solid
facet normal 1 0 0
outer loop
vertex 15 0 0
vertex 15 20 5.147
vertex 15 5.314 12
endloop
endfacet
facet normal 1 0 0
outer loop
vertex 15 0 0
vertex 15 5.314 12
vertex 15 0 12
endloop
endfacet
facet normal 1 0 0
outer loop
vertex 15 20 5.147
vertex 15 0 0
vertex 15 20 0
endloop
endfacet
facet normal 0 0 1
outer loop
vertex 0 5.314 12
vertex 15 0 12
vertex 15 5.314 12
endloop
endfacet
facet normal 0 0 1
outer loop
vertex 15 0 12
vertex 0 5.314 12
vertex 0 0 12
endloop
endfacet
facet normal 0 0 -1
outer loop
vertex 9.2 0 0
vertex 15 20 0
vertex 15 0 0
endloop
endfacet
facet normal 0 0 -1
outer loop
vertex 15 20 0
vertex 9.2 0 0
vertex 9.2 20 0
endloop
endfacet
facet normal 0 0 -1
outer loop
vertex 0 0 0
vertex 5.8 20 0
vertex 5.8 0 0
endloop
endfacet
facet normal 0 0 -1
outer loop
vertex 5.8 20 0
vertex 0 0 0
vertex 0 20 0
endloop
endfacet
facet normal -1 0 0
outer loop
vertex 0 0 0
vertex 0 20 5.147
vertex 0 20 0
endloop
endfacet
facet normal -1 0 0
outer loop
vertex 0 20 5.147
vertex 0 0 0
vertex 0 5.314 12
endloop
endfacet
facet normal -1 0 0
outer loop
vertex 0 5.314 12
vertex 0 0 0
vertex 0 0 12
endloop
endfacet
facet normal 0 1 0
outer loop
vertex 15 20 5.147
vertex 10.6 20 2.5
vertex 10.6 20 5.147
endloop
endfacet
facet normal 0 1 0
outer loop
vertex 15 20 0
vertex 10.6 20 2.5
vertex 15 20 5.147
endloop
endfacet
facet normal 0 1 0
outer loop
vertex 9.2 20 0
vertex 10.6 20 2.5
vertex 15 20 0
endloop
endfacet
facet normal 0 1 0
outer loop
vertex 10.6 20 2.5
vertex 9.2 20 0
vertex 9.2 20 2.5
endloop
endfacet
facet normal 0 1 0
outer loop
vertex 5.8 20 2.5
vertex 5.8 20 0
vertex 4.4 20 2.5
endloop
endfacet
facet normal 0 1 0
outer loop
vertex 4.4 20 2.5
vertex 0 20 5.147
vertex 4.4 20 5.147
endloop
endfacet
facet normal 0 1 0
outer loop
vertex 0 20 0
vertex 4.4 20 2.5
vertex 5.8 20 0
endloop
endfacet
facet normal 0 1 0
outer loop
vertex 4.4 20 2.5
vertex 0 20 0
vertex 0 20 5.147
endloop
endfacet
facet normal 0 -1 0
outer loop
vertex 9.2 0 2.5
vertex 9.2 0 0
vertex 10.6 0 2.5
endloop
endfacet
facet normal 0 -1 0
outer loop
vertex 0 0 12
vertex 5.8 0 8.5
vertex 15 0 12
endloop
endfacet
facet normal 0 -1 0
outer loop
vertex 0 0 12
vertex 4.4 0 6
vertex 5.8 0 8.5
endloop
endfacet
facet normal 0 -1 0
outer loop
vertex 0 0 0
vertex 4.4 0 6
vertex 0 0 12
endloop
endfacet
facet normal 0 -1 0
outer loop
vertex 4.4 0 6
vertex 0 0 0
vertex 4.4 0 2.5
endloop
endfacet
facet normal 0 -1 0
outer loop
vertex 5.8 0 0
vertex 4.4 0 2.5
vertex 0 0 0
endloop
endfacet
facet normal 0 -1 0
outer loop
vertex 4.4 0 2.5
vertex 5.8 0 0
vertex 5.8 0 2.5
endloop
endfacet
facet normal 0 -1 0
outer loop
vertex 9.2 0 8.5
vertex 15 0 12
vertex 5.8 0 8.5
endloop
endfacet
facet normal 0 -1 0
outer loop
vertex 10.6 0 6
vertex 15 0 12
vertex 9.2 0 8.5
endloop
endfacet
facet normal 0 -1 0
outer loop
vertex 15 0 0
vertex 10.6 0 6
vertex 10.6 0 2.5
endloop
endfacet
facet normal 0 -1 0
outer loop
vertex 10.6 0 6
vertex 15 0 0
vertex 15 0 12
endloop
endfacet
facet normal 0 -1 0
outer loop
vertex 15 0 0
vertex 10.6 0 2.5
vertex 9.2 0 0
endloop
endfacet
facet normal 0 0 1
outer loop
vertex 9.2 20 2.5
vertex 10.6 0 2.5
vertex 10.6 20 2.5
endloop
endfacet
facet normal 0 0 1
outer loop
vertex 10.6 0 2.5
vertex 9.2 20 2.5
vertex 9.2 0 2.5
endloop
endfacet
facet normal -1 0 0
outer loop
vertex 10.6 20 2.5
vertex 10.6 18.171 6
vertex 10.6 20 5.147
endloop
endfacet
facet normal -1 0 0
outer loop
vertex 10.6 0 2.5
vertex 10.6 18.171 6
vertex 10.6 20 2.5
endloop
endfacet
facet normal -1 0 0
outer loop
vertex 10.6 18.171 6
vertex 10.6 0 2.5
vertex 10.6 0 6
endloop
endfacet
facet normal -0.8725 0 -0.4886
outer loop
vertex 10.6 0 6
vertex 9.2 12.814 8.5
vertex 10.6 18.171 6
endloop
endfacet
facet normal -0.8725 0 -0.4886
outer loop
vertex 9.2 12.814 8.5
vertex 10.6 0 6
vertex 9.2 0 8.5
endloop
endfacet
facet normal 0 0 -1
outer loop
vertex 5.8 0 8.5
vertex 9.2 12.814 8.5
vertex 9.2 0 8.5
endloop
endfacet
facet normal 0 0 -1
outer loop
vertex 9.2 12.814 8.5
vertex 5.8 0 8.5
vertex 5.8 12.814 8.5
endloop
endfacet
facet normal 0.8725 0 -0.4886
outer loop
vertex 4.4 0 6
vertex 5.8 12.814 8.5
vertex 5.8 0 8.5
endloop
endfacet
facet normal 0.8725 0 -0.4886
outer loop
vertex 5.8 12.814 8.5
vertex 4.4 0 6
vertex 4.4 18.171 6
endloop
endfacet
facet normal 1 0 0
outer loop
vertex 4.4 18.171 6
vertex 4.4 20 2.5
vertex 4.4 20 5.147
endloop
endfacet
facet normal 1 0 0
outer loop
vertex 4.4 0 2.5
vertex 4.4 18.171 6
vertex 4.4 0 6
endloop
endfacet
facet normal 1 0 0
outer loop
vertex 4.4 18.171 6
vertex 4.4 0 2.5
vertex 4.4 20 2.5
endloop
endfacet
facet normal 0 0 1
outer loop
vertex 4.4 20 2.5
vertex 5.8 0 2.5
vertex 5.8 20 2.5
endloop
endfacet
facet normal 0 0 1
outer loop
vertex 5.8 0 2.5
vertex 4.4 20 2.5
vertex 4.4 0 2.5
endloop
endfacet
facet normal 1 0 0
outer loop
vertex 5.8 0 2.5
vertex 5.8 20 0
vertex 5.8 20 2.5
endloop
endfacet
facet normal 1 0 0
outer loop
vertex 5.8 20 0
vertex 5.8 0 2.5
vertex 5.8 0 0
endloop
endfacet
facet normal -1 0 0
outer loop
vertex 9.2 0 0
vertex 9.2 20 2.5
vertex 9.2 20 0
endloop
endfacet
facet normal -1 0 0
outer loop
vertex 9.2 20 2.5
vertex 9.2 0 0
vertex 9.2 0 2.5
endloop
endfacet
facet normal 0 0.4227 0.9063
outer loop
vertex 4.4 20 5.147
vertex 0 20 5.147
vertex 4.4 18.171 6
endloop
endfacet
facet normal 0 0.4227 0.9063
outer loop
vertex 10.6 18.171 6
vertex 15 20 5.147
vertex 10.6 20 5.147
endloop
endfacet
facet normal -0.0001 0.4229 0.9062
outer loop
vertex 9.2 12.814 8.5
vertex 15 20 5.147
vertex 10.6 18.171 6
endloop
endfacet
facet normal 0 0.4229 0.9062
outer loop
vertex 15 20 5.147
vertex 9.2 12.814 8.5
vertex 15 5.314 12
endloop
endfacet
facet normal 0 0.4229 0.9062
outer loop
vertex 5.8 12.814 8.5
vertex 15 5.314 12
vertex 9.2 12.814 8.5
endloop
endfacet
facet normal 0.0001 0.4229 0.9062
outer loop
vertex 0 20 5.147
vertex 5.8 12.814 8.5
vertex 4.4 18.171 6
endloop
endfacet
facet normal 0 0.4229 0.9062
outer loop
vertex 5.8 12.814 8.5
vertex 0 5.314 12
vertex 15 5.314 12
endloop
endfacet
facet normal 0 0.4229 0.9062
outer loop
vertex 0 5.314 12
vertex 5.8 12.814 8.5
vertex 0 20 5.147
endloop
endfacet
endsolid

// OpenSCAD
// The build plate I will be using for this build is an aluminium heated plate
// with a diameter of 220mm while the frame size needs a build plate of about
// 244mm diameter to fit on all three sides.
//
// An extension bracket to fit on the insides of all three frame sections will
// be used to make the the build plate fit.
//
// The bracket will consist os a stip of metal or aluminium the bolts onto the
// top of the frame extrusion in the center of each of the horizontal beams.
//
// For support a printed gusset will fit beneath the plate and against the
// extrusion frame. The gusset will be printed in ABS, but for extra protection
// from the heated bed, a layer of 3mm rubber will be used between the gusset
// and alu/metal plate.


plateT = 1.5;       // Thickness of the metal plate used for the extension top
isolationT = 3;     // Thickness of the isolation rubber between gusset and plate
extend = 20;        // The distance to extend into the frame

extrusion = 15;     // Openbeam extrusion size;


/**
 * This module is used to create a dynamic length extrusion from a 1000mm 1515
 * extrusion STL file
 **/
module extrusion_15(len=240) {
  difference() {
    import("1515_1000mm.stl", convexity=10);
    translate([-10,-10,len])
        cube([20,20,(1000-len)+2]);
  }
}

/**
 * To make adjustment easier, the gusset has a slot, much like the openbeam
 * extrusions, at the top.
 *
 * NOTE! The gusset is generated upside down, which is also the correct
 * orientation for printing.
 *
 * @param ext: The amount of extention into the frame.
 **/
module Gusset() {
    topT = plateT;          // Thickness of the top metal/alu strip
    isoT = isolationT;      // Thickness of the isolation rubber

    slotLipH = 2.5;     // Height of the upper lips of the slot
    slotDepth = 6;
    slotWidthT = 3.4;
    slotWidthB = 6.2;
    slotLipW = (slotWidthB-slotWidthT)/2;

    w = extrusion;      // Bracket width is the same as the extrusion width
    h = extrusion-isoT; // Max height of the bracket
    l = extend;            // Length it extends into the frame

    difference() {
        // The main stock - upside down
        cube([w, l, h]);
        // Slot for the M3 nuts to go in
        translate([-slotWidthB/2+w/2, l+1, slotLipH])
            rotate([90, 0, 0])
                linear_extrude(height=l+2, convexity=10)
                    polygon(points=[
                                [0, 0],
                                [slotLipW, 0],
                                [slotLipW, -slotLipH-0.5],
                                [slotLipW+slotWidthT, -slotLipH-0.5],
                                [slotLipW+slotWidthT, 0],
                                [slotWidthB, 0],
                                [slotWidthB, slotDepth-slotLipH],
                                [slotWidthB-slotLipW, slotDepth-slotLipH+slotLipH],
                                [slotLipW, slotDepth-slotLipH+slotLipH],
                                [0, slotDepth-slotLipH]
                            ]);
        // Slanted edge
        translate([-1, 5+0.1, h+0.1])
            rotate([0, 90, 0])
                linear_extrude(height=w+2, convexity=10)
                    polygon(points=[
                                [0, 0],
                                [h-5, l-5],
                                [0, l-5],
                            ]);
    }

}

/**
 * Shows a demo of what the gusset with rubber isolation and metal plate will
 * look like.
 **/
module BracketAssembly() {
    $fn=64;

    translate([extrusion/2, 0, 0])
        rotate([0, 180, 0])
            Gusset();
    difference() {
        union() {
            translate([-extrusion/2, 0, 0])
                color("gray")
                    cube([extrusion, extend, isolationT]);
            translate([-extrusion/2, -extrusion, isolationT])
                color("Silver")
                    cube([extrusion, extend+extrusion, plateT]);
        }
        // Slot the plate and isolation
        translate([0, extend/4, -1]) {
            cylinder(d=3, h=isolationT+plateT+2);
            translate([0, extend/2, 0])
                cylinder(d=3, h=isolationT+plateT+2);
            translate([-3/2, 0, 0])
                cube([3, extend/2, isolationT+plateT+2]);
        }
        // Extrusion mount hole
        translate([0, -extrusion/2, 0])
            cylinder(d=3, h=isolationT+plateT+2);
    }
    color("Silver")
    translate([-25, -7.5, -7.5+isolationT])
        rotate([0, 90, 0])
            extrusion_15(50);
}

Gusset();
*translate([30, 0, 0])
    BracketAssembly();
